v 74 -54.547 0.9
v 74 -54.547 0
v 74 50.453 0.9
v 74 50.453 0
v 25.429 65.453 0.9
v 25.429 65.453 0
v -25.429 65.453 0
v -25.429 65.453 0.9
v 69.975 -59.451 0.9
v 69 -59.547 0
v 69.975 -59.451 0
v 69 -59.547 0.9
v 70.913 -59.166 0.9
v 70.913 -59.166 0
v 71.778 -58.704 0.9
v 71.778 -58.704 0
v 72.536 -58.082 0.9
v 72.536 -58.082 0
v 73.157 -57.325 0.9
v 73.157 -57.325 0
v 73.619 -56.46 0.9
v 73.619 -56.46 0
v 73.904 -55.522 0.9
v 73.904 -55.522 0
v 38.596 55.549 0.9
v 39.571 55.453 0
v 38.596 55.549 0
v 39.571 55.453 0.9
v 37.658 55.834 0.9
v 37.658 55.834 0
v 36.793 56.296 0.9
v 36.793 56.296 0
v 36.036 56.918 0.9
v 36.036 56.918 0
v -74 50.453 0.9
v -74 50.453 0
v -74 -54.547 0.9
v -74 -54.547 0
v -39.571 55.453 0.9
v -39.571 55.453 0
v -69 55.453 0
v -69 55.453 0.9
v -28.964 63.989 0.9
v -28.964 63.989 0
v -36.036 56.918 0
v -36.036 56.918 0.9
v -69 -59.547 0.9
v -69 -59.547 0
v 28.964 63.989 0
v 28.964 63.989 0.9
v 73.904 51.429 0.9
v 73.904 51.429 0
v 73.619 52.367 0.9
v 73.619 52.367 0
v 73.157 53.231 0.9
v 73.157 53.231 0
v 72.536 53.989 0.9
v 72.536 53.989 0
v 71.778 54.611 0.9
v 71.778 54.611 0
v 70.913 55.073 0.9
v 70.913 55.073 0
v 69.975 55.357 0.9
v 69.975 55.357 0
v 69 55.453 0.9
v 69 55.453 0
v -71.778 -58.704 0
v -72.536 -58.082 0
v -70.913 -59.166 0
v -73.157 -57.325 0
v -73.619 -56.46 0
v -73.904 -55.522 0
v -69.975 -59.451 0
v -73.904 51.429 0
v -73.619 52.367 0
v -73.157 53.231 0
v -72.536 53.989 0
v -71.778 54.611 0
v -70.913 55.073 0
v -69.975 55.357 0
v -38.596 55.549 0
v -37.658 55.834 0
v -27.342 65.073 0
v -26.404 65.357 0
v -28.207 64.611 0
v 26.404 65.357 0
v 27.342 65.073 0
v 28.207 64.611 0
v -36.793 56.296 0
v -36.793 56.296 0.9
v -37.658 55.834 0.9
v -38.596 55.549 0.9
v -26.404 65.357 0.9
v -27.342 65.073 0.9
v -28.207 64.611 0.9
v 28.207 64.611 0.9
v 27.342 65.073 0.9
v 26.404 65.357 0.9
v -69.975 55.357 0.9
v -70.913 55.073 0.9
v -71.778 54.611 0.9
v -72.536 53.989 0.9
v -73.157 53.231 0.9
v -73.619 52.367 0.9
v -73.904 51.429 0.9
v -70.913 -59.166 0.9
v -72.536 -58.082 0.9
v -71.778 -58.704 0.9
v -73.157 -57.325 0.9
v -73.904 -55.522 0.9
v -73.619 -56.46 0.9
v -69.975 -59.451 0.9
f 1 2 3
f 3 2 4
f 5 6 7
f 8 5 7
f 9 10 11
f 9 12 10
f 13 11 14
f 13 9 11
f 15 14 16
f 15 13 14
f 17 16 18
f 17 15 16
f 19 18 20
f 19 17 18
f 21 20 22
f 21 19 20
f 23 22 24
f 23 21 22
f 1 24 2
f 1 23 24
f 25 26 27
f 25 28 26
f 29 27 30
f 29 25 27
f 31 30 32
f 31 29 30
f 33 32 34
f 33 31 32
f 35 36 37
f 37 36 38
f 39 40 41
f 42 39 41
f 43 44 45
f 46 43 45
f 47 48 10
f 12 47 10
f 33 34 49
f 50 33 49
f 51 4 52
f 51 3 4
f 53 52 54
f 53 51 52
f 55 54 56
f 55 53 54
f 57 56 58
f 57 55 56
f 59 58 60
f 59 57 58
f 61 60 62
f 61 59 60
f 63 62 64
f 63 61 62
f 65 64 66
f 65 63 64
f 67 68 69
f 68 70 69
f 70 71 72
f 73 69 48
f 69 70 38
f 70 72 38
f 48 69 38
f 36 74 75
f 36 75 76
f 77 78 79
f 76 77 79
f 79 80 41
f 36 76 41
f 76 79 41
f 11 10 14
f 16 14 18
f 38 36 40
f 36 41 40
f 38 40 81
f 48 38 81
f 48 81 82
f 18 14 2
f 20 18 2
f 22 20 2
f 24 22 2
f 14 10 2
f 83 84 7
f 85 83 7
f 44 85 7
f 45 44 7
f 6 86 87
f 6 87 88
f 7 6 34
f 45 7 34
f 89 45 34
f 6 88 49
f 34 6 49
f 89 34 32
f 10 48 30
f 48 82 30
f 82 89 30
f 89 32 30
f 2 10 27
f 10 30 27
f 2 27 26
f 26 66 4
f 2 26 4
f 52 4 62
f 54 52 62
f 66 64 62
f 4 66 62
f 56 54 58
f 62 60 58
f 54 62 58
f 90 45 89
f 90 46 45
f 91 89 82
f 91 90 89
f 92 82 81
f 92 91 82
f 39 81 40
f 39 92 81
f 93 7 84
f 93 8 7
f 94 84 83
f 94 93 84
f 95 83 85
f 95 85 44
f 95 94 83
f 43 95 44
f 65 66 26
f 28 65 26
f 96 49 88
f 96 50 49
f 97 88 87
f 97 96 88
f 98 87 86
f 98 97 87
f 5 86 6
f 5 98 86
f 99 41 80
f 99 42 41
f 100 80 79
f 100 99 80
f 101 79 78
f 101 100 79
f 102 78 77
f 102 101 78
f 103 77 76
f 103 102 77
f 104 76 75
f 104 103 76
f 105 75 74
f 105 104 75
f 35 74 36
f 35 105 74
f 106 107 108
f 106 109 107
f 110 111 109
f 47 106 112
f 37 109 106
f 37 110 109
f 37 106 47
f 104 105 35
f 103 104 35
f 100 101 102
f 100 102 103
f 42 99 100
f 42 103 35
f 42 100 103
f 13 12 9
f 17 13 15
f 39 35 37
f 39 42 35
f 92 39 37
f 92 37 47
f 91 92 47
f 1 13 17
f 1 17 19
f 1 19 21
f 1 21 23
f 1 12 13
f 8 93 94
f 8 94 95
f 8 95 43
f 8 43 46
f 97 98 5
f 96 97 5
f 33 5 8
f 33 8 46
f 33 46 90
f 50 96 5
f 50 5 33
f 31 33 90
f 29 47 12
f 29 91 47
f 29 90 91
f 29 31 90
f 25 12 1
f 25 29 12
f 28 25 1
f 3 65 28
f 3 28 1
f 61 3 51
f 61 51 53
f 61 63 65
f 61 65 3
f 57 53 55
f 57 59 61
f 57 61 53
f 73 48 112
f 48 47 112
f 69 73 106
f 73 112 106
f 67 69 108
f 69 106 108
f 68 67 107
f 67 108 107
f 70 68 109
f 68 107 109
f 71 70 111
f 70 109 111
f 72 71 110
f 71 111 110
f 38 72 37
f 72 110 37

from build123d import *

# Parameters (mm, degrees)
F1_DEPTH = 0.9
F2_R     = 5


# Not quite as in the source:
# - a feature names something its author has since deleted; it is built from what else it names


with BuildPart() as f1:
    # F0 (on Top) → F1 (new body)
    with BuildSketch(Plane.XY):
        Polygon((-74, -59.5467374876), (74, -59.5467374876), (74, 55.4532625124), (37.5, 55.4532625124), (27.5, 65.4532625124), (-27.5, 65.4532625124), (-37.5, 55.4532625124), (-74, 55.4532625124), align=None)
    extrude(amount=F1_DEPTH)

    # F2
    f2_edges = [f1.edges().sort_by_distance(p)[0] for p in [
        (37.5, 55.453263, 0.45),
        (27.5, 65.453263, 0.45),
        (-37.5, 55.453263, 0.45),
        (-27.5, 65.453263, 0.45),
        (-74, 55.453263, 0.45),
        (-74, -59.546737, 0.45),
        (74, -59.546737, 0.45),
        (74, 55.453263, 0.45),
    ]]
    fillet(f2_edges, radius=F2_R)


solid = f1.part
